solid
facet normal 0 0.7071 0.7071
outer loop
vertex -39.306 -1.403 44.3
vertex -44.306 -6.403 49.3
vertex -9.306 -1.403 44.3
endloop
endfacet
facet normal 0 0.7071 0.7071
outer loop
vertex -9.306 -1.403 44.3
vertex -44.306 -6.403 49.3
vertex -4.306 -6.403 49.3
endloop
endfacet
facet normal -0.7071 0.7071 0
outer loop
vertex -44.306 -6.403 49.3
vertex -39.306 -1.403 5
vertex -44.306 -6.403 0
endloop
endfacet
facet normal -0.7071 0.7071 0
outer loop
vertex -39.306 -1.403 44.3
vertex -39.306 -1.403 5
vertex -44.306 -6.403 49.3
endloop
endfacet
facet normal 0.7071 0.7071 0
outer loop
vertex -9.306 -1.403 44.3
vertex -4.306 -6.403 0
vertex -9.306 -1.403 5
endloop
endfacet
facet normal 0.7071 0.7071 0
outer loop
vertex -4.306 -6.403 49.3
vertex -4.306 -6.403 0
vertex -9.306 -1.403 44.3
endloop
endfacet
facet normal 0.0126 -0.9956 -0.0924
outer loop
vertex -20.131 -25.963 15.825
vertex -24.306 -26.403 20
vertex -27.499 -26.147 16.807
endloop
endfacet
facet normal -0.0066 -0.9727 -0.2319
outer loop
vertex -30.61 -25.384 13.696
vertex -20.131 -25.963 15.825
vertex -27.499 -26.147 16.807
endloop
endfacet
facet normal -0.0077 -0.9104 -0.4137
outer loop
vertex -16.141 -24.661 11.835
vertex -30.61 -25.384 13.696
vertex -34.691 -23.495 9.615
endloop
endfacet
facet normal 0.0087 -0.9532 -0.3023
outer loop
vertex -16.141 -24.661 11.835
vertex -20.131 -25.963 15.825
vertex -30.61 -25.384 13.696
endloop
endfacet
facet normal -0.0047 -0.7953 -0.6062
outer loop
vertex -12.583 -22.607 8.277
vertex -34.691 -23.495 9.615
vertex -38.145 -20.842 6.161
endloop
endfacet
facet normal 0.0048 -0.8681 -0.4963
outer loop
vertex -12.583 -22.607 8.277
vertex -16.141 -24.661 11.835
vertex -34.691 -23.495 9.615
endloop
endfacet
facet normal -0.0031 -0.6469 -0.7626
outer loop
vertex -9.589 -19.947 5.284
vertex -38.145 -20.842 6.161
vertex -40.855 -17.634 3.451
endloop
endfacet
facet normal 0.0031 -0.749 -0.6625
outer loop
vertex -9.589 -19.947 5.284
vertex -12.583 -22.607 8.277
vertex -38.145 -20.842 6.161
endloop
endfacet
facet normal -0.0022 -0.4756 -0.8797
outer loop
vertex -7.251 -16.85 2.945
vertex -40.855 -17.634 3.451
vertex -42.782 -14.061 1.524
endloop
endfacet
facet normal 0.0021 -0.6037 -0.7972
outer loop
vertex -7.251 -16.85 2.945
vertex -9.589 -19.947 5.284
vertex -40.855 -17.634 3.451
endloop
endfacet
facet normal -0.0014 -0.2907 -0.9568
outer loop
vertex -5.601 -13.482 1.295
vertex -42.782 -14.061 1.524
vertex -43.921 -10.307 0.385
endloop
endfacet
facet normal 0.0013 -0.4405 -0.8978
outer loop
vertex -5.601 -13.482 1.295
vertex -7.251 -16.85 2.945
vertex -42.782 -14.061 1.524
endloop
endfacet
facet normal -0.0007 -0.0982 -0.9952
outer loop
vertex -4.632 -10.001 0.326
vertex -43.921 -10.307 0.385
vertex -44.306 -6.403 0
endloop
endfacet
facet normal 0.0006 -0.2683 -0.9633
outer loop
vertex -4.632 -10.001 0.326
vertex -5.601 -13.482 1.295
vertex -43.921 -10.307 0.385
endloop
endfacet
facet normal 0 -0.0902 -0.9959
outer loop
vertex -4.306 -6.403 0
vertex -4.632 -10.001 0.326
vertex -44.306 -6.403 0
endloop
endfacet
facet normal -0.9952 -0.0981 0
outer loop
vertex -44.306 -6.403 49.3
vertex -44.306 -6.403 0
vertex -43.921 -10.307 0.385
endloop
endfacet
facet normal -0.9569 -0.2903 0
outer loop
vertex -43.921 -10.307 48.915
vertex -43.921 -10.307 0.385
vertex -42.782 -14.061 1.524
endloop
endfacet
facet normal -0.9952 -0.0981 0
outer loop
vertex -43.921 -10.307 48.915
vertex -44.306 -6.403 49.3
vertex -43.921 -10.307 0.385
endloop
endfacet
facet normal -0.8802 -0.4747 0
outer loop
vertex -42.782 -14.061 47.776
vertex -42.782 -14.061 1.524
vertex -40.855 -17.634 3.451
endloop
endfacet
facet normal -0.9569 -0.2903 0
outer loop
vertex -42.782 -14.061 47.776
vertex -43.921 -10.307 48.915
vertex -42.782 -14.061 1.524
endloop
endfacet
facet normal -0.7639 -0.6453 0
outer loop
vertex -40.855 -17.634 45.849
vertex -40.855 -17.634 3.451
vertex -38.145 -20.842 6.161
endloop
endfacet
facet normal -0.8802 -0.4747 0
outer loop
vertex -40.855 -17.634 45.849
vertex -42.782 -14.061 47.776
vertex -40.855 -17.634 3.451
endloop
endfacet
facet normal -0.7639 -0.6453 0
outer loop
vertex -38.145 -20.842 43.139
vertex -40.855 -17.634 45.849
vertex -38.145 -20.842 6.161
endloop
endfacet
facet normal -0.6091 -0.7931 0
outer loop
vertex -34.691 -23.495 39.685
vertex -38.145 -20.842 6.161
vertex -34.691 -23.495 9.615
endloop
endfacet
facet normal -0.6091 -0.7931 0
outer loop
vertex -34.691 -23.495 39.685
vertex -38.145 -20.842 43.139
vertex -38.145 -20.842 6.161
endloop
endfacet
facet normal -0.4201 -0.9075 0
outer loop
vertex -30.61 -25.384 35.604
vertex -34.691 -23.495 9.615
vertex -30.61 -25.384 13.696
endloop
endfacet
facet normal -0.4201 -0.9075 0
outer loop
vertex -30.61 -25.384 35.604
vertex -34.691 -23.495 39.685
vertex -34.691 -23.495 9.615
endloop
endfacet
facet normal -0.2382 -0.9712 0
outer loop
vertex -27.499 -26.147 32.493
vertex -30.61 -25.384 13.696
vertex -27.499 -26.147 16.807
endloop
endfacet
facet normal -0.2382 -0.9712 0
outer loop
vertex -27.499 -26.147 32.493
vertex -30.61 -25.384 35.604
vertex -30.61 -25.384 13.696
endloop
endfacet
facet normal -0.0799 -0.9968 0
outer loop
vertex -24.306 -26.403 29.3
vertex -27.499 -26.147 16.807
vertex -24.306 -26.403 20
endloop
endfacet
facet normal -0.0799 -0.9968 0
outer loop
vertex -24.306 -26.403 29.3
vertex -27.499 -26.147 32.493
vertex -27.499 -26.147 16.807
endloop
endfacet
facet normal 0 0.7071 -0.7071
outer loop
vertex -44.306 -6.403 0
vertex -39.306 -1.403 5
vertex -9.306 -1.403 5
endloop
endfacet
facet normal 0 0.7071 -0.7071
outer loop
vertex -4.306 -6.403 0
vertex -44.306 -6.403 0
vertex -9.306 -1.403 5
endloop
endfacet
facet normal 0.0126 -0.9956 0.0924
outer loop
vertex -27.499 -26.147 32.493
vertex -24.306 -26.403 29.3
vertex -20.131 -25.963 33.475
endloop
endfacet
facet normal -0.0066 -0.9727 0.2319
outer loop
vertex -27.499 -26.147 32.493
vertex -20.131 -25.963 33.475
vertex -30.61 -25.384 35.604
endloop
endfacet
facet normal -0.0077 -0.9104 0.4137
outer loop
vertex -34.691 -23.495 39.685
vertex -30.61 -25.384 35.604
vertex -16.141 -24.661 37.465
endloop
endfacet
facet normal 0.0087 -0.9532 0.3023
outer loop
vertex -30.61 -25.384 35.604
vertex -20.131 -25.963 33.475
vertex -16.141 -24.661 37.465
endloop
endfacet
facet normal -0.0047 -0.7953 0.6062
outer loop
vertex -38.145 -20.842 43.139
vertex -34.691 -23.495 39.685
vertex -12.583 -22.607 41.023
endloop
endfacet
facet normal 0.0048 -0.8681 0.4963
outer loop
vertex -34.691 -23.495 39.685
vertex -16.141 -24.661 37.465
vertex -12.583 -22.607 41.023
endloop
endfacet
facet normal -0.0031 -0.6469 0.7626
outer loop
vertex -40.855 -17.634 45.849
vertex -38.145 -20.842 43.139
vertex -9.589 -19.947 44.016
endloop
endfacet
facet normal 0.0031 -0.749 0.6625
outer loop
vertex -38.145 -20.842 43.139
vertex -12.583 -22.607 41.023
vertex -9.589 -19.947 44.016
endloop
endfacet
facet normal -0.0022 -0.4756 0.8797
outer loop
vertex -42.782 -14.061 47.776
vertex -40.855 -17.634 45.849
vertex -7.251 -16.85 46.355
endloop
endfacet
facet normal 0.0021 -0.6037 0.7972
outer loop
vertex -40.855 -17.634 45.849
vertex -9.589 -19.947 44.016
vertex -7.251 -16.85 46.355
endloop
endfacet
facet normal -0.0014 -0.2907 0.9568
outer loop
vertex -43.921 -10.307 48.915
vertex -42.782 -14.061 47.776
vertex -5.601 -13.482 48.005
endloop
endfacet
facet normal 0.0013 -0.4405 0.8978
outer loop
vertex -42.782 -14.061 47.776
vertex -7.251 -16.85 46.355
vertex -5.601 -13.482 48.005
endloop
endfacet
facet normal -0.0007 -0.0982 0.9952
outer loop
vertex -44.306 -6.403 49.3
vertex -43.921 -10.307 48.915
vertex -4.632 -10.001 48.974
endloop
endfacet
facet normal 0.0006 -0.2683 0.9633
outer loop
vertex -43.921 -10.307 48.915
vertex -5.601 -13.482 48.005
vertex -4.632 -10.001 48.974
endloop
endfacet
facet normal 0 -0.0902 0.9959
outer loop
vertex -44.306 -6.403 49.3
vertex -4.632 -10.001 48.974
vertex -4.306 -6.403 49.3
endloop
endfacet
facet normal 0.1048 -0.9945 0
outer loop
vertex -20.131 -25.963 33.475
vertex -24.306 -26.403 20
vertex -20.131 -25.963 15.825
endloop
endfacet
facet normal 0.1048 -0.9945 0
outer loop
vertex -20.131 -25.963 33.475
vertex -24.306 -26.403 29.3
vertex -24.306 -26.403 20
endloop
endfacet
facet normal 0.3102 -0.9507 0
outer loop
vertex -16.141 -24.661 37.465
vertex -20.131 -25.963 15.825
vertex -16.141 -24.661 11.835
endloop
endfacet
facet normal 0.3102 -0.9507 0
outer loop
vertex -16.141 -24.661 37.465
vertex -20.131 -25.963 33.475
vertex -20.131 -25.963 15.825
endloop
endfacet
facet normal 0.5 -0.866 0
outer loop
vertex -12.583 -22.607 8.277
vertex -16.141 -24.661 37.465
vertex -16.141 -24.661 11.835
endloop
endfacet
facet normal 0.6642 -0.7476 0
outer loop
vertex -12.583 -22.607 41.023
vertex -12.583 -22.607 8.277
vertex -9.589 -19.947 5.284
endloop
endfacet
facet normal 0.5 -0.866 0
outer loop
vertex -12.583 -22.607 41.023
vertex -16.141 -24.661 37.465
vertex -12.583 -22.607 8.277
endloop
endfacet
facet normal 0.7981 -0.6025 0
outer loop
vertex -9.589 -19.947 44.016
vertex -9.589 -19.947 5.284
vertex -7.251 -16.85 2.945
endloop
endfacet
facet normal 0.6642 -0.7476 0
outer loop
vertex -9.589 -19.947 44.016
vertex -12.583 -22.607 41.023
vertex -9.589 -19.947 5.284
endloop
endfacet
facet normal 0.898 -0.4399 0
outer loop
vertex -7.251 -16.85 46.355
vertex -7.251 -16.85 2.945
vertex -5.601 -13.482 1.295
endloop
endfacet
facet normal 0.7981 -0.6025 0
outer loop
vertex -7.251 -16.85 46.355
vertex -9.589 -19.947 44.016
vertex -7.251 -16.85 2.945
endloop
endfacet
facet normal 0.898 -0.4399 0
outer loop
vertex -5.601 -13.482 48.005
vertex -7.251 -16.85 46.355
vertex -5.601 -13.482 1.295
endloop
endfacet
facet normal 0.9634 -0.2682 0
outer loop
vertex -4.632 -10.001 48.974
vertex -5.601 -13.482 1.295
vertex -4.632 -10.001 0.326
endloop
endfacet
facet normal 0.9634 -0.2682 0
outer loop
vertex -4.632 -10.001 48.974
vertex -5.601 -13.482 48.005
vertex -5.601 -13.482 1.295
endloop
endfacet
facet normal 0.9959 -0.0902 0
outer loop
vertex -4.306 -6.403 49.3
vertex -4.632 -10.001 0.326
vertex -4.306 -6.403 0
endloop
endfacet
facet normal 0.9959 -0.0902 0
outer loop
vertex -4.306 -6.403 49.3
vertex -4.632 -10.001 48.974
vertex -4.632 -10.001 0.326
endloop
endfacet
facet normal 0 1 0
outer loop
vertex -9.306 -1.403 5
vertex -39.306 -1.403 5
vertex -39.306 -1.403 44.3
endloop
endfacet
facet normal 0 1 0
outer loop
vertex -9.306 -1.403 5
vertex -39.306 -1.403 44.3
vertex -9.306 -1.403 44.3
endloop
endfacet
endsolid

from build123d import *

# Parameters (mm, degrees)
F0_W     = 40
F0_H     = 25
F1_DEPTH = 49.3
F2_R     = 19.99999
F3_SIZE  = 5


# Not quite as in the source:
# - a fillet or chamfer is up to 0.001 mm smaller than in the source, because OpenCascade refuses the exact size


with BuildPart() as f1:
    # F0 (on Top) → F1 (new body)
    with BuildSketch(Plane.XY):
        with Locations((-24.3057886145, -13.9031428844)):
            Rectangle(F0_W, F0_H)
    extrude(amount=F1_DEPTH)

    # F2 (radius 20 in the source; OpenCascade refuses exactly that, so slightly less here)
    f2_edges = [f1.edges().sort_by_distance(p)[0] for p in [
        (-44.305789, -26.403143, 24.65),
        (-4.305789, -26.403143, 24.65),
        (-24.305789, -26.403143, 0),
        (-24.305789, -26.403143, 49.3),
    ]]
    fillet(f2_edges, radius=F2_R)

    # F3
    f3_edges = [f1.edges().sort_by_distance(p)[0] for p in [
        (-4.305789, -1.403143, 24.65),
        (-44.305789, -1.403143, 24.65),
        (-24.305789, -1.403143, 0),
        (-24.305789, -1.403143, 49.3),
    ]]
    chamfer(f3_edges, length=F3_SIZE)


solid = f1.part
